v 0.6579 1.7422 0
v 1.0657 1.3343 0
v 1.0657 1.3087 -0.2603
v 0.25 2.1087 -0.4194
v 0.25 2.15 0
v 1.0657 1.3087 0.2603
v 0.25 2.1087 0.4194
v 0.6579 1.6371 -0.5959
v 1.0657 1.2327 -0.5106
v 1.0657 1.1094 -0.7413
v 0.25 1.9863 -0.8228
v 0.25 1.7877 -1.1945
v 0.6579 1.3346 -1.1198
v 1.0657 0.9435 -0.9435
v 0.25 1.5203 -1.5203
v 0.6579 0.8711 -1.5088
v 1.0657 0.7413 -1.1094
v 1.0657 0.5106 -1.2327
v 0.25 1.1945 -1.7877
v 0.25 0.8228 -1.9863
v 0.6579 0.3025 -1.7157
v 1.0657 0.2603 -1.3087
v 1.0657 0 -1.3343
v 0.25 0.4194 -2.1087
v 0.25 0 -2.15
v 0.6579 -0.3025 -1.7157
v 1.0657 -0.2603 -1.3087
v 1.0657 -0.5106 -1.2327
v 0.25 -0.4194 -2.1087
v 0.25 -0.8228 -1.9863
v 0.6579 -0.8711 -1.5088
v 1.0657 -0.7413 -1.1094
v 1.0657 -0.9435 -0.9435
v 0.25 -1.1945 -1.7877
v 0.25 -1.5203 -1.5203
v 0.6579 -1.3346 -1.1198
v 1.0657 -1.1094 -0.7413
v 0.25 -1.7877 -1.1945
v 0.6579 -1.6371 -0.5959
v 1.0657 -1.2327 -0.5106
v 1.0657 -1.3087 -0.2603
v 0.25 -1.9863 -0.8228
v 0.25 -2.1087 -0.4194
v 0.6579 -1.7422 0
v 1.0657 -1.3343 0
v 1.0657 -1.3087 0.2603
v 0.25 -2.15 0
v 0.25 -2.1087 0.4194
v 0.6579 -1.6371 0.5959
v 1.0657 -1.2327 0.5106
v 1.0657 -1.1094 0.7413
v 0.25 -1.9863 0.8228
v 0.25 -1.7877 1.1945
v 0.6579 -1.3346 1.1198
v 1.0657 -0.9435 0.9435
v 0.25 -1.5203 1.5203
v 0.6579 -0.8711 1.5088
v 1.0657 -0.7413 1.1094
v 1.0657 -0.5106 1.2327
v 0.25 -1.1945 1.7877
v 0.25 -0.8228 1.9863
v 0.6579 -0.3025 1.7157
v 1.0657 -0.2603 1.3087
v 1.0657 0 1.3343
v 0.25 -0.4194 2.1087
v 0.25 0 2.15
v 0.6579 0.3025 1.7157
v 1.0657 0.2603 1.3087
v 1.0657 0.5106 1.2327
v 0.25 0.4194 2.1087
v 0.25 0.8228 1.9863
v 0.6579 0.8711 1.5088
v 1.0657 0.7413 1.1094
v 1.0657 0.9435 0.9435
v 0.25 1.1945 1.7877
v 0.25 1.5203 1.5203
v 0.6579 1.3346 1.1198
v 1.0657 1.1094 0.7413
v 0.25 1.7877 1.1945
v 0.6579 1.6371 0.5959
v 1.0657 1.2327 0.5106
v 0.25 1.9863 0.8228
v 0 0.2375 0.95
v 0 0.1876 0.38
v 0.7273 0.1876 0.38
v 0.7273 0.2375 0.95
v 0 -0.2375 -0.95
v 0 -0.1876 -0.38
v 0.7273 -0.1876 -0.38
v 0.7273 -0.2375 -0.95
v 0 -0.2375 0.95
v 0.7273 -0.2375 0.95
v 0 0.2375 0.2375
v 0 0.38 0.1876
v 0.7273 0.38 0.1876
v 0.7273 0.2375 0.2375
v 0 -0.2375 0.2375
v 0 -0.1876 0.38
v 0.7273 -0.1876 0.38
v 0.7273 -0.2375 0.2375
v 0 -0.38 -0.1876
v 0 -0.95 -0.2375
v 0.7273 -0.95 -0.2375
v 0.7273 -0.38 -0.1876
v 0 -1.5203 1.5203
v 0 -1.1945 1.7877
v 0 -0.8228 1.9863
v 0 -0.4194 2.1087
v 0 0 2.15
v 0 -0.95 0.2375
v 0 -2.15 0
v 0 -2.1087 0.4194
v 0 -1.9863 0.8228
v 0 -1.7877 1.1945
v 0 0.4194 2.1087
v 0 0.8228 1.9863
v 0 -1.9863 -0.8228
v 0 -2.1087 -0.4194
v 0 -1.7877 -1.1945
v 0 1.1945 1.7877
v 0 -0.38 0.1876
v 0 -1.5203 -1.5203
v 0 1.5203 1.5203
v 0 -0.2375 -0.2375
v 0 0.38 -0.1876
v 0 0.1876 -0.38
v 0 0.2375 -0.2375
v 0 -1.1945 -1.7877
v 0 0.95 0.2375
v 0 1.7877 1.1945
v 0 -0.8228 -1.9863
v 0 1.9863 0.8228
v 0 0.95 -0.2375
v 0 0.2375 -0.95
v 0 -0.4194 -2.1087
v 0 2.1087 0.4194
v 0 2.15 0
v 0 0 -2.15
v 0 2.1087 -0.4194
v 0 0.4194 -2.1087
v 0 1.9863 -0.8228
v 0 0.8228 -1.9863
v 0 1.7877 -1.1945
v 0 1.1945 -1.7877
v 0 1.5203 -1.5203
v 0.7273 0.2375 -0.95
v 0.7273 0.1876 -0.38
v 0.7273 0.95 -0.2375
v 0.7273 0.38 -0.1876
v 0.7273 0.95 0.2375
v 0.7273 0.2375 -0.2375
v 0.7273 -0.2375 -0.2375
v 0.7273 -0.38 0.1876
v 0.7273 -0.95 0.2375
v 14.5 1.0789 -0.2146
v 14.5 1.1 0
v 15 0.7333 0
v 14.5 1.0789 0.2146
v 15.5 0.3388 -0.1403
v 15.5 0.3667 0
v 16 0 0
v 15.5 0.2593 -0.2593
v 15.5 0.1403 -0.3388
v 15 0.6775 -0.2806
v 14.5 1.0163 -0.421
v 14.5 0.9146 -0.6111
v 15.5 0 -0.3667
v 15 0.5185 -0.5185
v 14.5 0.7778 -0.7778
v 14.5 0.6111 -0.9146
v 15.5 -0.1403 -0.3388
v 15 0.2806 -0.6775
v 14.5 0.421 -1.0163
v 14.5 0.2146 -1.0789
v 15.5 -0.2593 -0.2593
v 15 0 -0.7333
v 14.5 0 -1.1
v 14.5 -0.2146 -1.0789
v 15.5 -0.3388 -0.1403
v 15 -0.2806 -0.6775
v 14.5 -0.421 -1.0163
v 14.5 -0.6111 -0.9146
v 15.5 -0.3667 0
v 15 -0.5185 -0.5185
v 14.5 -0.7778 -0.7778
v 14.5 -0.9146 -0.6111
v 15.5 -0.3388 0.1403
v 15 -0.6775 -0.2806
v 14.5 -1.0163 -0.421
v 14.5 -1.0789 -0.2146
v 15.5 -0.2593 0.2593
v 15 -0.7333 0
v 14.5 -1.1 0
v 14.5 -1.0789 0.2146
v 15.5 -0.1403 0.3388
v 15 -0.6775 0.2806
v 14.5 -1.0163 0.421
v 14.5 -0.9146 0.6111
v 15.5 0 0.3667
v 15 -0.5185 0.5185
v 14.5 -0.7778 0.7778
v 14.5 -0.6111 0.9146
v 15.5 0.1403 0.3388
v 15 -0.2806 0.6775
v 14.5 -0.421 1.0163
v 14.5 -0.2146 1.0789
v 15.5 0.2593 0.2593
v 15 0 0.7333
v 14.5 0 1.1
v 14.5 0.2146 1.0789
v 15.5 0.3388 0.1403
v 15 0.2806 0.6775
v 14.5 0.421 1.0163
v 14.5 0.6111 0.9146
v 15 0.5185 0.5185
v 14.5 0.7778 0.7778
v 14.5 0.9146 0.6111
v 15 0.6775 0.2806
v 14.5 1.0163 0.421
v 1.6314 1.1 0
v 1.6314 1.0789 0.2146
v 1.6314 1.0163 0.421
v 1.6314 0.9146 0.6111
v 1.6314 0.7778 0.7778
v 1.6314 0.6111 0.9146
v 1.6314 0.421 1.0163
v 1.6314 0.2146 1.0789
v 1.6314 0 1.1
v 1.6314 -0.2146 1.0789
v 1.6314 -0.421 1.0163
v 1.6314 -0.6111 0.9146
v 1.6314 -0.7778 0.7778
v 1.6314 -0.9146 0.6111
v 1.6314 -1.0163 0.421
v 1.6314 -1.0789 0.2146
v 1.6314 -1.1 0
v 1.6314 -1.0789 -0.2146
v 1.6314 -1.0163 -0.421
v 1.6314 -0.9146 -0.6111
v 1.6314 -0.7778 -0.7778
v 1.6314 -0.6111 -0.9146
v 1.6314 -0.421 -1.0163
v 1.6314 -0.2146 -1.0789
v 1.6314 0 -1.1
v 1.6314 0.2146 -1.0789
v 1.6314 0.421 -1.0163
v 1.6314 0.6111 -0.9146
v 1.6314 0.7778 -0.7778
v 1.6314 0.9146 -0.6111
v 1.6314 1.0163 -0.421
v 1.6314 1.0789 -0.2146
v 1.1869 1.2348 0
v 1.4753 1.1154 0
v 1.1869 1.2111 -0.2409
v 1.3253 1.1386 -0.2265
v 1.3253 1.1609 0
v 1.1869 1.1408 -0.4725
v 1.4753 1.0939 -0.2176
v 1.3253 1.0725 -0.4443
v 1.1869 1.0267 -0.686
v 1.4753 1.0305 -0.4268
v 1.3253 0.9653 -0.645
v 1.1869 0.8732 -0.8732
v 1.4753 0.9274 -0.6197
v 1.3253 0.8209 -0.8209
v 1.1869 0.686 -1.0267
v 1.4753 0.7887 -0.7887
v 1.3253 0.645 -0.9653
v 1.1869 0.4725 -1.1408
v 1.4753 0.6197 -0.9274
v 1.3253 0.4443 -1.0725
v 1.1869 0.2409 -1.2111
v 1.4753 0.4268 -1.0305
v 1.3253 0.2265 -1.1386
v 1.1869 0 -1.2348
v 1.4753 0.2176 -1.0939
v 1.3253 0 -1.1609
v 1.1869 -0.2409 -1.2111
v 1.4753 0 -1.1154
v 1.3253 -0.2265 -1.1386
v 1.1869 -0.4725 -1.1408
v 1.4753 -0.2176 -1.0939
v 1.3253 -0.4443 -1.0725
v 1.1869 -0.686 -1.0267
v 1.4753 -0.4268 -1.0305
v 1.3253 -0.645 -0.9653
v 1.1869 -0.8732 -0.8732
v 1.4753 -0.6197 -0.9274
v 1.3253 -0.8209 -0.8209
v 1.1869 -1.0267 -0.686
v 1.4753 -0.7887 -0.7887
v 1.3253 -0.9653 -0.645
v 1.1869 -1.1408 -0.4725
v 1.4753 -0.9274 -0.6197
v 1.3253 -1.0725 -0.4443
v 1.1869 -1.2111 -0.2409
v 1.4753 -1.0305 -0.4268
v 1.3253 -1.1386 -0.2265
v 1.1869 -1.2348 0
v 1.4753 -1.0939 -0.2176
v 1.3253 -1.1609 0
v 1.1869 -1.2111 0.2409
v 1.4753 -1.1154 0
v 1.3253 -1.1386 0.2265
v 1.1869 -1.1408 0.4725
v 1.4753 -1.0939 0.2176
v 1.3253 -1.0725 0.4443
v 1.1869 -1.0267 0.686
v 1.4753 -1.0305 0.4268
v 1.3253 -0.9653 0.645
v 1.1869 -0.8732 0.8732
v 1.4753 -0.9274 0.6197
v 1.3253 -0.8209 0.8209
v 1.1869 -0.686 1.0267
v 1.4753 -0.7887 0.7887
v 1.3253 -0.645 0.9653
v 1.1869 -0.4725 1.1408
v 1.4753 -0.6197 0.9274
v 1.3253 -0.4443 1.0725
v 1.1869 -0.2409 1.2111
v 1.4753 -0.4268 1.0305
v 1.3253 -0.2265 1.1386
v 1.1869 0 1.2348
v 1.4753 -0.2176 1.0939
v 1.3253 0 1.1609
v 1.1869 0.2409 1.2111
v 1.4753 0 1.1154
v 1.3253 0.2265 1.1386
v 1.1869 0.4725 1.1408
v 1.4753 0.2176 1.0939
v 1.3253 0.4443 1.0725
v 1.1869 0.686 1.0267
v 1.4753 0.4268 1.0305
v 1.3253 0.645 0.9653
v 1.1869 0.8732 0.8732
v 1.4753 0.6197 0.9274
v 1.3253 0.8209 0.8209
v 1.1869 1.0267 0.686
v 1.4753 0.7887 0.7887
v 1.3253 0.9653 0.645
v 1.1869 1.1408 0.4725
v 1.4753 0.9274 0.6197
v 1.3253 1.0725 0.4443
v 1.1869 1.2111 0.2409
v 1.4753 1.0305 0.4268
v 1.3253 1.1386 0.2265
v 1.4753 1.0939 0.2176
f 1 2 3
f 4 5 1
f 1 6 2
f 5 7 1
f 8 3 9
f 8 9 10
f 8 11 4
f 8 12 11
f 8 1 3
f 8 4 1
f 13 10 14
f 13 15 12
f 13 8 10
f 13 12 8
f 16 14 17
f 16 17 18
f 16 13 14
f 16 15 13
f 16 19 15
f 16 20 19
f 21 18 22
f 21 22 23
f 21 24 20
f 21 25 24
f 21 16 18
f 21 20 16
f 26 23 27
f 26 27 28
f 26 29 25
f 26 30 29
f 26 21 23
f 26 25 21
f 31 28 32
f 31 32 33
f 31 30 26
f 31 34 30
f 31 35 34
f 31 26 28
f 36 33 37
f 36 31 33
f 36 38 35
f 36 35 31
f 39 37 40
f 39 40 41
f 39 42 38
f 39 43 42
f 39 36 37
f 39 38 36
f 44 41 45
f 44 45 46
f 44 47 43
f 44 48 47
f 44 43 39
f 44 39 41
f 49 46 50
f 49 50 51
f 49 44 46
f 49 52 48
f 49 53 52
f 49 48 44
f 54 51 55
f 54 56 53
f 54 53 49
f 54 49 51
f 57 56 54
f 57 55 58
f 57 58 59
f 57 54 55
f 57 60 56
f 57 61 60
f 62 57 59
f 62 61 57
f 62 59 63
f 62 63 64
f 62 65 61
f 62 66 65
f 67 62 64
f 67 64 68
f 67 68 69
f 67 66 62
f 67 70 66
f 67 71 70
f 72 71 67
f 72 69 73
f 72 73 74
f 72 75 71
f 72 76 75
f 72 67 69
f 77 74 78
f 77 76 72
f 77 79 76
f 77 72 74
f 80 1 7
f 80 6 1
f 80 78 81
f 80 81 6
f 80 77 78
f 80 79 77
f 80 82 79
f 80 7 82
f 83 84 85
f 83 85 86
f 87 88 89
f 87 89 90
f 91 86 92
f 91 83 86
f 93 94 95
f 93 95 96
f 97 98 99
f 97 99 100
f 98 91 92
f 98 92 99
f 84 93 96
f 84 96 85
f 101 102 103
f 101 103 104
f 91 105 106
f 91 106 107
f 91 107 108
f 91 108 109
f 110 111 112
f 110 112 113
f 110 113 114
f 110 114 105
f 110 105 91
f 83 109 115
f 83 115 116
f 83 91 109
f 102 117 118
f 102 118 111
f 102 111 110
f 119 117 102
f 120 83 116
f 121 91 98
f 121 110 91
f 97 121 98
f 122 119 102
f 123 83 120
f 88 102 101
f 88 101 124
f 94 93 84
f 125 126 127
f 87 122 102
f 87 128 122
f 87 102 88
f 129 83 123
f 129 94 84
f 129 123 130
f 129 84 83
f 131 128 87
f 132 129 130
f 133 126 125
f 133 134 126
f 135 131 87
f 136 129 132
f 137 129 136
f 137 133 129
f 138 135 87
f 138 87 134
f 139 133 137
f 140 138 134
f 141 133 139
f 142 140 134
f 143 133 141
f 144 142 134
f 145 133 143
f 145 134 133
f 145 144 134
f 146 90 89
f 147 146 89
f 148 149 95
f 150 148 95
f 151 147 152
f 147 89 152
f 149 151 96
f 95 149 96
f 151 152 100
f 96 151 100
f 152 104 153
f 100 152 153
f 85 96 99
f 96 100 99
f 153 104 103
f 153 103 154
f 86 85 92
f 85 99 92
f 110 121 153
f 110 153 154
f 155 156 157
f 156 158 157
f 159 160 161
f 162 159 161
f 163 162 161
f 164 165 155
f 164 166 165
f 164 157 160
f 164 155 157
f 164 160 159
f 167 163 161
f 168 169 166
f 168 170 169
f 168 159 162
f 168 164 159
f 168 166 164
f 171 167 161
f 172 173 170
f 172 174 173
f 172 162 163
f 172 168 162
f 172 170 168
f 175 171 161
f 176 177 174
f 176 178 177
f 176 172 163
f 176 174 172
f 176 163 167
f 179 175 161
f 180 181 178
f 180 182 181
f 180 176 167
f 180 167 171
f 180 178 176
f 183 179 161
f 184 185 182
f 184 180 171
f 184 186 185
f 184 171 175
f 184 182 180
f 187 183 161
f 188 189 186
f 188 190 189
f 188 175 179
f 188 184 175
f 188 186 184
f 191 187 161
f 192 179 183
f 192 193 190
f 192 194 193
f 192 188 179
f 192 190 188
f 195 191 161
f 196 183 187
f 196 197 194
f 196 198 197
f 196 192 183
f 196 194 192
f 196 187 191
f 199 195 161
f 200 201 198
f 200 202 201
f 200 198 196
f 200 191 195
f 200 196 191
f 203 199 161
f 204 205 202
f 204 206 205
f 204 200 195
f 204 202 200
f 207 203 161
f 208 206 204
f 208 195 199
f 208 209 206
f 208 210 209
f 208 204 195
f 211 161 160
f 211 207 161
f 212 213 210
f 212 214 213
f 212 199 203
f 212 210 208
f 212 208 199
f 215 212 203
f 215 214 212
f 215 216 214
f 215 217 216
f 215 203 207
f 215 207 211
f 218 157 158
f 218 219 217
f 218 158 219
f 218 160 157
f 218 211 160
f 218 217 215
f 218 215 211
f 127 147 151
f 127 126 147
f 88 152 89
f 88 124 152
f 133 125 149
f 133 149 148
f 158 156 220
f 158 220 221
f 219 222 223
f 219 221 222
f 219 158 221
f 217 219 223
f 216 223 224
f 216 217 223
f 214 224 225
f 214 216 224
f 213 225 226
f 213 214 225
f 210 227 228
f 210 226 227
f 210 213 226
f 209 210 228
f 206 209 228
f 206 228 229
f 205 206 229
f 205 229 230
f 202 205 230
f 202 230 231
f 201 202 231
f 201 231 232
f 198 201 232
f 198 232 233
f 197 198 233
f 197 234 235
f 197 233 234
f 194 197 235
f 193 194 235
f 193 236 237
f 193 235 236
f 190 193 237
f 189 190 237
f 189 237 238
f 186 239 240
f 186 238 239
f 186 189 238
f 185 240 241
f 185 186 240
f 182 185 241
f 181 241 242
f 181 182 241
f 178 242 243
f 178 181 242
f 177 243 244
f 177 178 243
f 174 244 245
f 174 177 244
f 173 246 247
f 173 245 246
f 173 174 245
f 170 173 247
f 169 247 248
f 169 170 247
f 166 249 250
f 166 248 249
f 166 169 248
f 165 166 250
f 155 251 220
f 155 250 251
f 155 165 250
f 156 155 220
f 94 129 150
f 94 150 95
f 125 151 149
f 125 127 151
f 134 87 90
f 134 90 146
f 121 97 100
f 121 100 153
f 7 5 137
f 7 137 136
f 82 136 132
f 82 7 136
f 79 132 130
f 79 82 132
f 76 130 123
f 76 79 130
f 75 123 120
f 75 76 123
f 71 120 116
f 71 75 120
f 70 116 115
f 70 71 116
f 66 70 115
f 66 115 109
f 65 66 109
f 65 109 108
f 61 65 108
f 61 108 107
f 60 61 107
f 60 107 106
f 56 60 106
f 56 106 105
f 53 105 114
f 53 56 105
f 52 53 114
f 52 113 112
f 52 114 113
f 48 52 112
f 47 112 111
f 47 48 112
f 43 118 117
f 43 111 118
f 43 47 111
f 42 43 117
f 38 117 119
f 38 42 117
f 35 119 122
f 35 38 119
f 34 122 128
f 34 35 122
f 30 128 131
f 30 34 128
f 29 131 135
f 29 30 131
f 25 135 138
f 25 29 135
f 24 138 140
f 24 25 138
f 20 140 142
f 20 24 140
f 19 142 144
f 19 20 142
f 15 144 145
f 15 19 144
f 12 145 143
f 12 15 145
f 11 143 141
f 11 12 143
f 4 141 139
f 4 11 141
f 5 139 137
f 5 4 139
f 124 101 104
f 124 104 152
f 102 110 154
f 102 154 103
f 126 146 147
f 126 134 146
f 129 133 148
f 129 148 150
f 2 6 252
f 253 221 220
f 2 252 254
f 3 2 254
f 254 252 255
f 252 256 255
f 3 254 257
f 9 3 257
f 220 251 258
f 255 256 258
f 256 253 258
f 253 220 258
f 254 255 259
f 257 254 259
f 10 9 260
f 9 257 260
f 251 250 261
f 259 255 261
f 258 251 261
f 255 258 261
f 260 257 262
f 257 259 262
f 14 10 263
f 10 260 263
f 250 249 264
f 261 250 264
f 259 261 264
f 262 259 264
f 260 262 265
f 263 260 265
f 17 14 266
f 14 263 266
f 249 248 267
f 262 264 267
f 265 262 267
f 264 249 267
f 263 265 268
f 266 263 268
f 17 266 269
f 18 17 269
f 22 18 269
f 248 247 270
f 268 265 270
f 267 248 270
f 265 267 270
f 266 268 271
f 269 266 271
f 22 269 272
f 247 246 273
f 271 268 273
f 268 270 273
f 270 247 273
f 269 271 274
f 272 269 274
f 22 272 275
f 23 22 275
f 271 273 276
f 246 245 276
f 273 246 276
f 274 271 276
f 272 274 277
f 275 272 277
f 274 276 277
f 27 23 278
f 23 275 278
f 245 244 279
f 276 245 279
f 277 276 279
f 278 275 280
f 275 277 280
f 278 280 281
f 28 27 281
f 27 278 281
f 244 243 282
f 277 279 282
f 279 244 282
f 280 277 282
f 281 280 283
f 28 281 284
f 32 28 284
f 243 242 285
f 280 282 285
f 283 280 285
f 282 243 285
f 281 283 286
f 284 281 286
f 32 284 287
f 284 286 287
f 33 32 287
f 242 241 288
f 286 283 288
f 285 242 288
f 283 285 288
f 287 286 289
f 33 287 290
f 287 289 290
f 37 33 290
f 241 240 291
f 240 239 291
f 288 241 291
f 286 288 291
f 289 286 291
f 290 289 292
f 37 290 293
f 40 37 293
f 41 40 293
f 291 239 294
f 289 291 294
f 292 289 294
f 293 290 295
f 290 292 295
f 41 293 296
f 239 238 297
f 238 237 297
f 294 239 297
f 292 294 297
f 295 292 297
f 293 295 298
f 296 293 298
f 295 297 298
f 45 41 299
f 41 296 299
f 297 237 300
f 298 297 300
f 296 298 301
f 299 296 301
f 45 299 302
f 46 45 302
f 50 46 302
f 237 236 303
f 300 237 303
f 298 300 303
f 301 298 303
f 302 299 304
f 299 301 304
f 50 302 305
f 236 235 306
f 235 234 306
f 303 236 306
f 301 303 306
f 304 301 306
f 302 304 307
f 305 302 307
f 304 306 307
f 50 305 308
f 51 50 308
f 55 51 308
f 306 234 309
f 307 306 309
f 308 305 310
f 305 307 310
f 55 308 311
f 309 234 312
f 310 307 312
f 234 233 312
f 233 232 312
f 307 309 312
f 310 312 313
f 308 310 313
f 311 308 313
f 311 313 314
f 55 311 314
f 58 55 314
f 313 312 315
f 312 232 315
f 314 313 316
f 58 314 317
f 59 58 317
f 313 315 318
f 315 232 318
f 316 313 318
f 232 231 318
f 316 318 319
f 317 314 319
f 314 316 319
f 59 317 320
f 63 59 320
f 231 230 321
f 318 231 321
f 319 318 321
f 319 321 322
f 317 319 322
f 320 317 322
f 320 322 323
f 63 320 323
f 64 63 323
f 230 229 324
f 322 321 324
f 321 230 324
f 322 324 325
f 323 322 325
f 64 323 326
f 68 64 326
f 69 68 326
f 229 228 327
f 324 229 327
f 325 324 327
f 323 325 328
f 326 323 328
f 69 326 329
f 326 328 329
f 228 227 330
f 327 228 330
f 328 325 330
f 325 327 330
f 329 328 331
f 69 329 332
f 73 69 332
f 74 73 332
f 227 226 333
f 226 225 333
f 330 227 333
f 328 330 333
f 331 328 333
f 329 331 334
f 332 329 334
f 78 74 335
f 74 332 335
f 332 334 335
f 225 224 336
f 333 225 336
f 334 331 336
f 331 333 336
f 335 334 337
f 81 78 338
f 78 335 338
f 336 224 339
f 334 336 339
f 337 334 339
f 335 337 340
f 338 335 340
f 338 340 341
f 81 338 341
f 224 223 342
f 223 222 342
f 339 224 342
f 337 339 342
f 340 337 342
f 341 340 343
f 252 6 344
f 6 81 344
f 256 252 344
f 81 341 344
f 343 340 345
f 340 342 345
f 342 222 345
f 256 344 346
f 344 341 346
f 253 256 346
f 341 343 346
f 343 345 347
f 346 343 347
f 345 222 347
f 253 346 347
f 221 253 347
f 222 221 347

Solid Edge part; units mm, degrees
sketch "Sketch1" plane through (0, 0, 0) normal (0, 0, 1) x (1, 0, 0)
  line L0 (0, 0) -> (0, 2.15)
  line L1 (0, 2.15) -> (0.25, 2.15)
  line L2 (0.25, 2.15) -> (1.0657, 1.3343)
  arc A0 (1.0657, 1.3343) -> (1.6314, 1.1) centre (1.6314, 1.9) ccw
  line L3 (1.6314, 1.1) -> (14.5, 1.1)
  line L4 (14.5, 1.1) -> (16, 0)
  line L5 (16, 0) -> (0, 0)
revolve "RevolvedProtrusion1" add sketch "Sketch1" angle 360 about axis through (20.3, 0, 0) along (-1, 0, 0)
cosmetic_thread "Thread_1" size "M2.2" thread depth 12.4
sketch "Sketch2" plane through (0, 0, 0) normal (1, 0, 0) x (0, 1, 0)
  line L0 (0.2375, 0.95) -> (-0.2375, 0.95)
  line L1 (-0.2375, 0.95) -> (-0.1876, 0.38)
  line L2 (-0.1876, 0.38) -> (-0.2375, 0.2375)
  line L3 (-0.2375, 0.2375) -> (-0.38, 0.1876)
  line L4 (-0.38, 0.1876) -> (-0.95, 0.2375)
  line L5 (-0.95, 0.2375) -> (-0.95, -0.2375)
  line L6 (-0.95, -0.2375) -> (-0.38, -0.1876)
  line L7 (-0.38, -0.1876) -> (-0.2375, -0.2375)
  line L8 (-0.2375, -0.2375) -> (-0.1876, -0.38)
  line L9 (-0.1876, -0.38) -> (-0.2375, -0.95)
  line L10 (-0.2375, -0.95) -> (0.2375, -0.95)
  line L11 (0.2375, -0.95) -> (0.1876, -0.38)
  line L12 (0.1876, -0.38) -> (0.2375, -0.2375)
  line L13 (0.2375, -0.2375) -> (0.38, -0.1876)
  line L14 (0.38, -0.1876) -> (0.95, -0.2375)
  line L15 (0.95, -0.2375) -> (0.95, 0.2375)
  line L16 (0.95, 0.2375) -> (0.38, 0.1876)
  line L17 (0.38, 0.1876) -> (0.2375, 0.2375)
  line L18 (0.2375, 0.2375) -> (0.1876, 0.38)
  line L19 (0.1876, 0.38) -> (0.2375, 0.95)
extrude "ExtrudedCutout_1" cut sketch "Sketch2" along normal blind 0.7273
properties part number "bene_inox_212409-2,2X16"
